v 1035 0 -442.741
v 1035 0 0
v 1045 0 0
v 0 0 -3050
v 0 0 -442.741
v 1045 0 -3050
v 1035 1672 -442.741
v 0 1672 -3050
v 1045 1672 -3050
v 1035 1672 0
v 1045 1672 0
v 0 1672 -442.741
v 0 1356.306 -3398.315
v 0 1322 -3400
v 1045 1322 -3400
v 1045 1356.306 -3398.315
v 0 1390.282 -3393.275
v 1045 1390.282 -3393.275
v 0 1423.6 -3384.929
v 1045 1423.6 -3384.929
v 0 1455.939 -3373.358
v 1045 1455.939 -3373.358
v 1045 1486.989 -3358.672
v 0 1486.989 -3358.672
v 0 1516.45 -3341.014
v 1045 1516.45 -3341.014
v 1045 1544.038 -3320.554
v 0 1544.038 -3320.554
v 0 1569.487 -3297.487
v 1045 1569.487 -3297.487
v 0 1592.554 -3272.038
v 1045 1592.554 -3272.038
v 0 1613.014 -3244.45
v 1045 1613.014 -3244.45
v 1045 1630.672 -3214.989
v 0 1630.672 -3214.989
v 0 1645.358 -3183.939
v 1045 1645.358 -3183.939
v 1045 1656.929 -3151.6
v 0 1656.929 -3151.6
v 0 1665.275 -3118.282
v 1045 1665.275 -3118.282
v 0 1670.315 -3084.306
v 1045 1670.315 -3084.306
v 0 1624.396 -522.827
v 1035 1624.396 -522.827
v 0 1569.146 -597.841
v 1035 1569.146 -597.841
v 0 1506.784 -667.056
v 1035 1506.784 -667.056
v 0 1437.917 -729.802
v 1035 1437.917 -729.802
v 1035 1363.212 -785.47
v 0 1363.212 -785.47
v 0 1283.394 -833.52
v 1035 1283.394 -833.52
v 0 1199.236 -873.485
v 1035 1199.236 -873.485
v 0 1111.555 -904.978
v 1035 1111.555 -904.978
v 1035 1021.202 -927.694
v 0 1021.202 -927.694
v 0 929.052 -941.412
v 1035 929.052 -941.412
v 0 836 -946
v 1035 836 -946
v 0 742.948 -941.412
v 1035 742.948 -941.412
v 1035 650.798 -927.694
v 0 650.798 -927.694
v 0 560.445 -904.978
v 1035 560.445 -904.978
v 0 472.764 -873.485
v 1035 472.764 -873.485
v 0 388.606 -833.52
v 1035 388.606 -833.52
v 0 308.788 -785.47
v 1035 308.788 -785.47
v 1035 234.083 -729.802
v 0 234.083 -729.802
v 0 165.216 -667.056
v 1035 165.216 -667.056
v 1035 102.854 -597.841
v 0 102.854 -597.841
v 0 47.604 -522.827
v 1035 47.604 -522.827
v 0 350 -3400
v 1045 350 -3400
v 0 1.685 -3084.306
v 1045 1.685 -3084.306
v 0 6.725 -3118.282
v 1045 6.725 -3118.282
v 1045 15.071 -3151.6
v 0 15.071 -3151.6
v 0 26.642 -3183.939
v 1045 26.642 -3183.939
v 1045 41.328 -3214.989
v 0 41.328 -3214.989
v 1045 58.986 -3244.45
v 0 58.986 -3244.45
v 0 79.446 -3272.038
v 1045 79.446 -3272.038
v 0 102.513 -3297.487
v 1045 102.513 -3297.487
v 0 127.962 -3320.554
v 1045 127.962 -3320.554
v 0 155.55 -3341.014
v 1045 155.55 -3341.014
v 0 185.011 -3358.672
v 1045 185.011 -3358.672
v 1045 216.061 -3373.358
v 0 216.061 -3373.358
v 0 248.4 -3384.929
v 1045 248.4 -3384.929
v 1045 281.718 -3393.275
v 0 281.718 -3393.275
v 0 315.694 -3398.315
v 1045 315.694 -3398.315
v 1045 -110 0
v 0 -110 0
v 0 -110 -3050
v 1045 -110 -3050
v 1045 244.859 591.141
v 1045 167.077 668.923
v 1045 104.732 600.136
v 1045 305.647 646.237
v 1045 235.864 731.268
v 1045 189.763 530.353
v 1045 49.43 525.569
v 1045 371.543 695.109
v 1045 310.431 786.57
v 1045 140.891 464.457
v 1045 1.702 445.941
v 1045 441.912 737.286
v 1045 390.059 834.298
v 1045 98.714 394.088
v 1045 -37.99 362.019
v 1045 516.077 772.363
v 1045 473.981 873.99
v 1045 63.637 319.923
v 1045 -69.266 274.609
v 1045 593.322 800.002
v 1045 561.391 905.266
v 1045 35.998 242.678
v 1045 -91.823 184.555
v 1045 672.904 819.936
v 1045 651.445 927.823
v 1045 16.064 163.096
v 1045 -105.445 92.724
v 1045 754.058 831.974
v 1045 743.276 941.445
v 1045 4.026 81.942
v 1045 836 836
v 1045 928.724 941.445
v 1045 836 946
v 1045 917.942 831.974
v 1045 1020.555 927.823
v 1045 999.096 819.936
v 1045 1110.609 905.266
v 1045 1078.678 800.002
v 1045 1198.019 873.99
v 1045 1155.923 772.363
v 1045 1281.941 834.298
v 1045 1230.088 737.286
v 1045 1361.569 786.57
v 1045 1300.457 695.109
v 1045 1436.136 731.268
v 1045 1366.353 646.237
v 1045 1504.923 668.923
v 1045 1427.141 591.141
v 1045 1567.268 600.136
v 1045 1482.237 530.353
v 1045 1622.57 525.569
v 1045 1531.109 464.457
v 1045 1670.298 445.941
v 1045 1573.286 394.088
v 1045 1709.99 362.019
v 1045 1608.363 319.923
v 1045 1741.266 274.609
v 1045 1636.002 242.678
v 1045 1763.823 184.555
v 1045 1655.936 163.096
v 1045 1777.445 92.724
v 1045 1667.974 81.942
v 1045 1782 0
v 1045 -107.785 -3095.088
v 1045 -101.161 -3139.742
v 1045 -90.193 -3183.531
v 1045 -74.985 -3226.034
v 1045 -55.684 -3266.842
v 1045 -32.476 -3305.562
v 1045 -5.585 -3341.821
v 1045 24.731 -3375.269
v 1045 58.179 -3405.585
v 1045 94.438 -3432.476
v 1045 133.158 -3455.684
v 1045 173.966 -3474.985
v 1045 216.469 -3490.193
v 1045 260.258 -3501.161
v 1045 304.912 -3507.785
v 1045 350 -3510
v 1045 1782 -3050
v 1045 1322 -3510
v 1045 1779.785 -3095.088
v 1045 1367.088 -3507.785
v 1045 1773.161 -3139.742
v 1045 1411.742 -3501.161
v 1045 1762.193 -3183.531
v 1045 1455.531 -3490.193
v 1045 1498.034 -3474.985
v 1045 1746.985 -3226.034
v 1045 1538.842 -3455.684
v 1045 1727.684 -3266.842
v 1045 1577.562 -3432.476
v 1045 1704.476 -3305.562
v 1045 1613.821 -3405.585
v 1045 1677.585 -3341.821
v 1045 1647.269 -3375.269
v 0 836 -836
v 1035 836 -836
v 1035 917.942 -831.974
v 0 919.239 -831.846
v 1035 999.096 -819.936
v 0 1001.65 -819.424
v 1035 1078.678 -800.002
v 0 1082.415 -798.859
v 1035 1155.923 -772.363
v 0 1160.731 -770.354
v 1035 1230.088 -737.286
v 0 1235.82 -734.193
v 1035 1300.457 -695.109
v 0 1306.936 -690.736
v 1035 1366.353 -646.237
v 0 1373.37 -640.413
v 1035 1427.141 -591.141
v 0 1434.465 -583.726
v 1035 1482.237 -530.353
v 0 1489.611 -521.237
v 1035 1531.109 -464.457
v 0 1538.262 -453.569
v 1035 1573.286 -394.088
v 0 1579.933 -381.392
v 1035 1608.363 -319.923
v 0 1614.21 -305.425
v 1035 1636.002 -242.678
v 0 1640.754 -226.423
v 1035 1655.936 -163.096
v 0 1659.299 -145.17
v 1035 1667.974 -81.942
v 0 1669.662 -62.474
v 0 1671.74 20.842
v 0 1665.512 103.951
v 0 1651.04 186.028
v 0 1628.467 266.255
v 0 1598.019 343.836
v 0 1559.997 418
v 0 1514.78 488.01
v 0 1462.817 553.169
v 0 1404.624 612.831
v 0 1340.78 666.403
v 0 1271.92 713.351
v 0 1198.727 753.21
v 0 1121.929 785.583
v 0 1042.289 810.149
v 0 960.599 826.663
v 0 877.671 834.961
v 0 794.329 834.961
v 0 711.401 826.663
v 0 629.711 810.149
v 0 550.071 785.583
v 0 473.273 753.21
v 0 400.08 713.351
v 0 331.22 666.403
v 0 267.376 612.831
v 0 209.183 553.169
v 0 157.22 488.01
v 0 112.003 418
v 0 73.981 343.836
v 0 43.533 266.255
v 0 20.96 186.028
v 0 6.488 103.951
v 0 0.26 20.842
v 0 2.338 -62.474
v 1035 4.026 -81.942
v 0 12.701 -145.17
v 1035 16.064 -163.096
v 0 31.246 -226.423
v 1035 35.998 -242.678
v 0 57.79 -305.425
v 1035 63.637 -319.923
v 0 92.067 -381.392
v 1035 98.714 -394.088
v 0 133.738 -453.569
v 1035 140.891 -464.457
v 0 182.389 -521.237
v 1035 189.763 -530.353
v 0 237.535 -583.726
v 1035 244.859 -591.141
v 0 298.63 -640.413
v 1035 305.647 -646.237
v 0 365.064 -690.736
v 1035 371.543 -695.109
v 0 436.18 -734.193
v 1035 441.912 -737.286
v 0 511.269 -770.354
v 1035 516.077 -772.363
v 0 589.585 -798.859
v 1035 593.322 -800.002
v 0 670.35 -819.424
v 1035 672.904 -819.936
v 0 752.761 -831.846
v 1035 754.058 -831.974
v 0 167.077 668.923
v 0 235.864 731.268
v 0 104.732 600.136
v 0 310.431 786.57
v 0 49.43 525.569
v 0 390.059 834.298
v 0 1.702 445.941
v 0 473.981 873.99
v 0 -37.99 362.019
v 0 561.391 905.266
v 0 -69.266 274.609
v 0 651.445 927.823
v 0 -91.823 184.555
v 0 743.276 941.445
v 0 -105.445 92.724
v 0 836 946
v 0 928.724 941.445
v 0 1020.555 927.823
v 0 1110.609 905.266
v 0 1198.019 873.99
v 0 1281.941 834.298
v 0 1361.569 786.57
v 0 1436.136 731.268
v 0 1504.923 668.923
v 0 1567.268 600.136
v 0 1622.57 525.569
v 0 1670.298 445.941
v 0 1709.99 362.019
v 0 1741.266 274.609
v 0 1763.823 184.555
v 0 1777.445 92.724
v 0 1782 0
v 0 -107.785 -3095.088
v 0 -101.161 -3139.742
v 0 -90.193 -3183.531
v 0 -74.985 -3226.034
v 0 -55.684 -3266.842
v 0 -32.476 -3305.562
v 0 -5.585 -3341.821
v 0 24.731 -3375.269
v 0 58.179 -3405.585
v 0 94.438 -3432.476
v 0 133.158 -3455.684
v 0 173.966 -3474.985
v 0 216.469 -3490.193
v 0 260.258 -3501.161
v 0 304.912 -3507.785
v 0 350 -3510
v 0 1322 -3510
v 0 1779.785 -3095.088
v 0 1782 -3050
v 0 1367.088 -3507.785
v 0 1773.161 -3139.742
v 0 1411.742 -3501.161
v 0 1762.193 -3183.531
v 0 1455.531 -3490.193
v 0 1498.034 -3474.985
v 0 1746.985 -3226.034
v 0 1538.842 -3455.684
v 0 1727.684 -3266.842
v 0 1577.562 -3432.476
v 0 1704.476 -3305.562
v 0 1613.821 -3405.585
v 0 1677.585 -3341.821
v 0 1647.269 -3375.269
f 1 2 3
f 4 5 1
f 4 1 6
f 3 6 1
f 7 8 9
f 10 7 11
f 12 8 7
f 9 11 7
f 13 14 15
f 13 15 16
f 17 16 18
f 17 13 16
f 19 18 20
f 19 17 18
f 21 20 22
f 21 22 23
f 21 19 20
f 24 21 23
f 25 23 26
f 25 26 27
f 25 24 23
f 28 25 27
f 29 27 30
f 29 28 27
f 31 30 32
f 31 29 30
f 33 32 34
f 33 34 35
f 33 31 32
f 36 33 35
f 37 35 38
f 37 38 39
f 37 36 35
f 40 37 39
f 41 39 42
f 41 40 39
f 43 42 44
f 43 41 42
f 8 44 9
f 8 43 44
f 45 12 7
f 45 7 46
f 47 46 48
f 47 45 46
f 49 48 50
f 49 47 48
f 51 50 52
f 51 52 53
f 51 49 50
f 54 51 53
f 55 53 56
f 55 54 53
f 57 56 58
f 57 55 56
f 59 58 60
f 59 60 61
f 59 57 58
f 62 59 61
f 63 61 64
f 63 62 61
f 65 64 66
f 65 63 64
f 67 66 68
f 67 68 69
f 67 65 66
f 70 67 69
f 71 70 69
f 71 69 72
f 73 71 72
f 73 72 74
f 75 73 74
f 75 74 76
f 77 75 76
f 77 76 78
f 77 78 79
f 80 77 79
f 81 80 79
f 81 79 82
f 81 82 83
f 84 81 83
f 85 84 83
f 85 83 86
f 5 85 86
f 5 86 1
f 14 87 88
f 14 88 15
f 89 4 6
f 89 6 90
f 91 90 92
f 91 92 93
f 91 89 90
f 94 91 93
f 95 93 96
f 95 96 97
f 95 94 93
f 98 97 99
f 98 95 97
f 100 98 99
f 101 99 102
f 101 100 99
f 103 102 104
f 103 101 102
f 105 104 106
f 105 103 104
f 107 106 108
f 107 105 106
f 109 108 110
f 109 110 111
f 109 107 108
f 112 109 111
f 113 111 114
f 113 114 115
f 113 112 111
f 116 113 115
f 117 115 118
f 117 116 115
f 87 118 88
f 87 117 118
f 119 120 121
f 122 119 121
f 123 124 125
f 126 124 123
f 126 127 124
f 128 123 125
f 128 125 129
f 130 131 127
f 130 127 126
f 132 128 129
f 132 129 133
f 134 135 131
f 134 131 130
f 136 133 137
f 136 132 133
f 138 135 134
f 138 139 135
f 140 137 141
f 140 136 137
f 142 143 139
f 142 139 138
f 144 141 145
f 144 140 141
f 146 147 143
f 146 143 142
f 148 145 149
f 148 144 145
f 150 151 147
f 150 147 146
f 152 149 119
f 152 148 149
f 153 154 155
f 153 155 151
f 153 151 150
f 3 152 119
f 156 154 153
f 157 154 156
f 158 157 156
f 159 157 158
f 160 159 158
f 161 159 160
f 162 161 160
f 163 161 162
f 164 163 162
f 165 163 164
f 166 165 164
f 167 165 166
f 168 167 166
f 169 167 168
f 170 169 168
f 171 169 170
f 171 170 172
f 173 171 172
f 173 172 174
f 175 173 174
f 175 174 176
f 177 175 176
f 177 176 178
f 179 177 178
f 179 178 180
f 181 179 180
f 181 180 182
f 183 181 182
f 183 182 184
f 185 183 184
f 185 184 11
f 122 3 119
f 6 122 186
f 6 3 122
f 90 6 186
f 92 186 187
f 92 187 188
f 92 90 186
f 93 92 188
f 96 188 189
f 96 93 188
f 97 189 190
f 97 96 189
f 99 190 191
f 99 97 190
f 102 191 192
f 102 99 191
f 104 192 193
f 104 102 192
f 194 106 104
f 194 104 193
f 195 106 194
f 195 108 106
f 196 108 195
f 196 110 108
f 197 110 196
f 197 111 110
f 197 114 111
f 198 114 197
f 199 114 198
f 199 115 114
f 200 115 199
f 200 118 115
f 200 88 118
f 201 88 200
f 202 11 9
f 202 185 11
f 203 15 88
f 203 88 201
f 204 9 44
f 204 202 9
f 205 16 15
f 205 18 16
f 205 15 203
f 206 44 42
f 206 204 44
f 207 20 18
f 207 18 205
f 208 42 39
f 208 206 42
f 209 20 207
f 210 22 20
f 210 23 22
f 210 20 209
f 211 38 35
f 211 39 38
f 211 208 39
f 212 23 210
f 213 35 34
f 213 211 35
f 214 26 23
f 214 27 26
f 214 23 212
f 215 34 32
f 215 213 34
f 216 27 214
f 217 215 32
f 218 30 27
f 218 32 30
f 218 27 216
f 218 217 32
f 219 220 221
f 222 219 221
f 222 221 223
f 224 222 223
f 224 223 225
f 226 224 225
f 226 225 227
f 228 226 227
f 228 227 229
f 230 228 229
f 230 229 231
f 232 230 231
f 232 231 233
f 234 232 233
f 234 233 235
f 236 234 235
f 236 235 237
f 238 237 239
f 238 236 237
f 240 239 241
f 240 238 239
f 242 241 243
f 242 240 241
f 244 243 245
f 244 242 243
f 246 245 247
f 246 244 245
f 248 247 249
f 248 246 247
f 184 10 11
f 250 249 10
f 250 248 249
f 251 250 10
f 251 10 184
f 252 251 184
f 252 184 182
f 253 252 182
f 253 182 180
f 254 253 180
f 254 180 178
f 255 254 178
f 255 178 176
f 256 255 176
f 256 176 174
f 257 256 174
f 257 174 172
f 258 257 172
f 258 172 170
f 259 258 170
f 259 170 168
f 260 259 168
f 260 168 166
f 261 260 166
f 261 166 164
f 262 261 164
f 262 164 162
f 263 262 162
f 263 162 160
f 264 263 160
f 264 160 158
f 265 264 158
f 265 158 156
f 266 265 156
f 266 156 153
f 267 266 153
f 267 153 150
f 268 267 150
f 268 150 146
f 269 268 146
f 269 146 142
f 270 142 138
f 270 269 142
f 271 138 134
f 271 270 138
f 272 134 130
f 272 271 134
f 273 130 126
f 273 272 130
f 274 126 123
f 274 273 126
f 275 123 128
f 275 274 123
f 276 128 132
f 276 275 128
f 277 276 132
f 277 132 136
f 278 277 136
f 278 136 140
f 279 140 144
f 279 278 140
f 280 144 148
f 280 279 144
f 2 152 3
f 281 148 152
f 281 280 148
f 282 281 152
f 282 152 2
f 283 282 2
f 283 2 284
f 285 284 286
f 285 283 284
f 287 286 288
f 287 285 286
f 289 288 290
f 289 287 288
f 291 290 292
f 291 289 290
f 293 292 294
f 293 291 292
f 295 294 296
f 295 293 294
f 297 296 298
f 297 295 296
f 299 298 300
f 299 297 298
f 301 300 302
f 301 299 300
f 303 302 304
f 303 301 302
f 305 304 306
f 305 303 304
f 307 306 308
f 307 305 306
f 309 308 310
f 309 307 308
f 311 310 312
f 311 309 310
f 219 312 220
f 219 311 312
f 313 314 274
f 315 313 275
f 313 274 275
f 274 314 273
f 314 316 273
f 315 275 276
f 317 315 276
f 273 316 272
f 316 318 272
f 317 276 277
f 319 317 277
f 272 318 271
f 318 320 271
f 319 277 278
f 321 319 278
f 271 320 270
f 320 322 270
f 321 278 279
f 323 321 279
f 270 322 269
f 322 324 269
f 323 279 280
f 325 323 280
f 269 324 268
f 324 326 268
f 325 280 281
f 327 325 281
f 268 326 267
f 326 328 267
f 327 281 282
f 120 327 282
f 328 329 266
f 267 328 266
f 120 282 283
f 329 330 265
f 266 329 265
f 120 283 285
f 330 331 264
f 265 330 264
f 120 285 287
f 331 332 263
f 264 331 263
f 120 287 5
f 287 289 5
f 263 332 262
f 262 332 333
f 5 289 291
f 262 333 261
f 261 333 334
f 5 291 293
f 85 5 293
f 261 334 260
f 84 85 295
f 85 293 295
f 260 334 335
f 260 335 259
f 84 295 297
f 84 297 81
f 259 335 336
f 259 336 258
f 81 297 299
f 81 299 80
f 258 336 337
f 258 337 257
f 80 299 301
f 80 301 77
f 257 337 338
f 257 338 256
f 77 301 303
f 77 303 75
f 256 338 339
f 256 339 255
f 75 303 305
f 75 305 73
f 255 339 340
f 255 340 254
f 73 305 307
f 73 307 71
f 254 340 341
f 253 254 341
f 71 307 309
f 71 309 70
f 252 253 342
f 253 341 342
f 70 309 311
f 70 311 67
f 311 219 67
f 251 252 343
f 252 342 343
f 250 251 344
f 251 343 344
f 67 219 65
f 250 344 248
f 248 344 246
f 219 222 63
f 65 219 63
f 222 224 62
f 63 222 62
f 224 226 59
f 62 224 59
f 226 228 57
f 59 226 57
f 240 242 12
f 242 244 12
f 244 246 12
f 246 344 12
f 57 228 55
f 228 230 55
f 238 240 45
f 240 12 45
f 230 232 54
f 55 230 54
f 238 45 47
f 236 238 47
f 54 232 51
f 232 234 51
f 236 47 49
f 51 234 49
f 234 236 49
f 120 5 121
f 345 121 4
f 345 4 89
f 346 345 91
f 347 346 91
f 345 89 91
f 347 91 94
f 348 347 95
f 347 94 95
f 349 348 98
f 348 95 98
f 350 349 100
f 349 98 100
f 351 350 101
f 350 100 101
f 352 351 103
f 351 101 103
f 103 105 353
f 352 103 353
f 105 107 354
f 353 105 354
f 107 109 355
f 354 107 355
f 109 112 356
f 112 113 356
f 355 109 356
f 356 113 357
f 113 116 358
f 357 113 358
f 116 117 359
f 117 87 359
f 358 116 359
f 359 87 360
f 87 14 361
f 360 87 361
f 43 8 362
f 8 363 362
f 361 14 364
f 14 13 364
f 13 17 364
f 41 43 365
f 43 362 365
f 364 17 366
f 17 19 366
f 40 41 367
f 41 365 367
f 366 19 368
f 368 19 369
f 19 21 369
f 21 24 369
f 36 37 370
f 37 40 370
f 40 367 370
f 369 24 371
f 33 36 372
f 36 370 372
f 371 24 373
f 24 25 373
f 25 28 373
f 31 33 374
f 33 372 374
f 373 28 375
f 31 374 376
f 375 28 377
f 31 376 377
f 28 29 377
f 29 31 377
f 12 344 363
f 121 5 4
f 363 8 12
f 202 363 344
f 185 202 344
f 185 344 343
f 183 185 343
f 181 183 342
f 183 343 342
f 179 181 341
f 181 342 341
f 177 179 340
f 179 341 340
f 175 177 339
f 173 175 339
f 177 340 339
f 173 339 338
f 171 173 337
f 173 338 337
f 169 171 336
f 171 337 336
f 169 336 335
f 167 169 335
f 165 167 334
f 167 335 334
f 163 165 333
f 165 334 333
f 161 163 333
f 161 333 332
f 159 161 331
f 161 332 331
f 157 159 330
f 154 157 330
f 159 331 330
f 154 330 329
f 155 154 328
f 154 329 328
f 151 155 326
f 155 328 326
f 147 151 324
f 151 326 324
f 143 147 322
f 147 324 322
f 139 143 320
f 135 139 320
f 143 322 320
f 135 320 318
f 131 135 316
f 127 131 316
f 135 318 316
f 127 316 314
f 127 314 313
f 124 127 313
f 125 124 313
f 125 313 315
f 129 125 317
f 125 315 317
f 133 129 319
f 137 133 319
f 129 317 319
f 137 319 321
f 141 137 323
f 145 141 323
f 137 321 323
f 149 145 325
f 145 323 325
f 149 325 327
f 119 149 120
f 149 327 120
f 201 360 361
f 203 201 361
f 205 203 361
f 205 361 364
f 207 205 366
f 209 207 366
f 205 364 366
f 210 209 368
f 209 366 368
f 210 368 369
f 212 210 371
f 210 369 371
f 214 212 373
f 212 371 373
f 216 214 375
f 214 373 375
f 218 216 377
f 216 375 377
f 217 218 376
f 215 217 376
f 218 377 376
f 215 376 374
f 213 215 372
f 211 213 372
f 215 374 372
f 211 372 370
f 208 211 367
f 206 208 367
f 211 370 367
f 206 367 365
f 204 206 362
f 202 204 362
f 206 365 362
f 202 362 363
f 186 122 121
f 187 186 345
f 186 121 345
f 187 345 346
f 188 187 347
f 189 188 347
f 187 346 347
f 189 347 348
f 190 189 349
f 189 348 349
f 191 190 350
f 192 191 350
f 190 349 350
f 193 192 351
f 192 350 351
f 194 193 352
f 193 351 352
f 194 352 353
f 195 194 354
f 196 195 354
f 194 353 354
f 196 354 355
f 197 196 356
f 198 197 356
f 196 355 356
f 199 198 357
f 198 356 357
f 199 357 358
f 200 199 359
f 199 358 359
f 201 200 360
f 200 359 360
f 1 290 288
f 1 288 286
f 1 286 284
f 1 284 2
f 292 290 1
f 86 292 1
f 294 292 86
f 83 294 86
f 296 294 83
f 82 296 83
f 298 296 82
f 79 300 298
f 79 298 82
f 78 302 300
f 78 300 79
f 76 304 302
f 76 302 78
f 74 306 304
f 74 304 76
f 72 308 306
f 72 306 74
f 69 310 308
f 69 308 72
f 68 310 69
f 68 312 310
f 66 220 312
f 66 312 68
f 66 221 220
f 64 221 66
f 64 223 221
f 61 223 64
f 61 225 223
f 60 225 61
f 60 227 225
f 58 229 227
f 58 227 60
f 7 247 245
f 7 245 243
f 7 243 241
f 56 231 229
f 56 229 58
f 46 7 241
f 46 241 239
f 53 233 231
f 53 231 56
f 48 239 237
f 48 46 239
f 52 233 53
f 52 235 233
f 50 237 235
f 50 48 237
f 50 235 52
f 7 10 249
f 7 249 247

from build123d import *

# Parameters (mm, degrees)
SKETCH1_R           = 836
BOSS_EXTRUDE1_DEPTH = 1045
SKETCH2_W           = 1071.493924567
SKETCH2_H           = 1672
CUT_EXTRUDE1_DEPTH  = 10


with BuildPart() as part:
    # Sketch1 → Boss-Extrude1 (new body)
    with BuildSketch(Plane(origin=(0, 0, 0), x_dir=(0, 0, -1), z_dir=(1, 0, 0))):
        with BuildLine():
            Line((0, -110), (3050, -110))
            ThreePointArc((3050, -110), (3375.269119346, 24.730880654), (3510, 350))
            Line((3510, 350), (3510, 1322))
            ThreePointArc((3510, 1322), (3375.269119346, 1647.269119346), (3050, 1782))
            Line((3050, 1782), (0, 1782))
            ThreePointArc((0, 1782), (-946, 836), (0, -110))
        make_face()
        with Locations((0, 836)):
            Circle(SKETCH1_R, mode=Mode.SUBTRACT)
        with BuildLine():
            Line((442.741459545, 0), (3050, 0))
            ThreePointArc((3050, 0), (3297.487373415, 102.512626585), (3400, 350))
            Line((3400, 350), (3400, 1322))
            ThreePointArc((3400, 1322), (3297.487373415, 1569.487373415), (3050, 1672))
            Line((3050, 1672), (442.741459545, 1672))
            ThreePointArc((442.741459545, 1672), (946, 836), (442.741459545, 0))
        make_face(mode=Mode.SUBTRACT)
    extrude(amount=BOSS_EXTRUDE1_DEPTH)

    # Sketch2 → Cut-Extrude1 (cut)
    with BuildSketch(Plane(origin=(1045, 0, 0), x_dir=(0, 0, -1), z_dir=(1, 0, 0))):
        with Locations((535.746962284, 836)):
            Rectangle(SKETCH2_W, SKETCH2_H)
    extrude(amount=-CUT_EXTRUDE1_DEPTH, mode=Mode.SUBTRACT)


solid = part.part
